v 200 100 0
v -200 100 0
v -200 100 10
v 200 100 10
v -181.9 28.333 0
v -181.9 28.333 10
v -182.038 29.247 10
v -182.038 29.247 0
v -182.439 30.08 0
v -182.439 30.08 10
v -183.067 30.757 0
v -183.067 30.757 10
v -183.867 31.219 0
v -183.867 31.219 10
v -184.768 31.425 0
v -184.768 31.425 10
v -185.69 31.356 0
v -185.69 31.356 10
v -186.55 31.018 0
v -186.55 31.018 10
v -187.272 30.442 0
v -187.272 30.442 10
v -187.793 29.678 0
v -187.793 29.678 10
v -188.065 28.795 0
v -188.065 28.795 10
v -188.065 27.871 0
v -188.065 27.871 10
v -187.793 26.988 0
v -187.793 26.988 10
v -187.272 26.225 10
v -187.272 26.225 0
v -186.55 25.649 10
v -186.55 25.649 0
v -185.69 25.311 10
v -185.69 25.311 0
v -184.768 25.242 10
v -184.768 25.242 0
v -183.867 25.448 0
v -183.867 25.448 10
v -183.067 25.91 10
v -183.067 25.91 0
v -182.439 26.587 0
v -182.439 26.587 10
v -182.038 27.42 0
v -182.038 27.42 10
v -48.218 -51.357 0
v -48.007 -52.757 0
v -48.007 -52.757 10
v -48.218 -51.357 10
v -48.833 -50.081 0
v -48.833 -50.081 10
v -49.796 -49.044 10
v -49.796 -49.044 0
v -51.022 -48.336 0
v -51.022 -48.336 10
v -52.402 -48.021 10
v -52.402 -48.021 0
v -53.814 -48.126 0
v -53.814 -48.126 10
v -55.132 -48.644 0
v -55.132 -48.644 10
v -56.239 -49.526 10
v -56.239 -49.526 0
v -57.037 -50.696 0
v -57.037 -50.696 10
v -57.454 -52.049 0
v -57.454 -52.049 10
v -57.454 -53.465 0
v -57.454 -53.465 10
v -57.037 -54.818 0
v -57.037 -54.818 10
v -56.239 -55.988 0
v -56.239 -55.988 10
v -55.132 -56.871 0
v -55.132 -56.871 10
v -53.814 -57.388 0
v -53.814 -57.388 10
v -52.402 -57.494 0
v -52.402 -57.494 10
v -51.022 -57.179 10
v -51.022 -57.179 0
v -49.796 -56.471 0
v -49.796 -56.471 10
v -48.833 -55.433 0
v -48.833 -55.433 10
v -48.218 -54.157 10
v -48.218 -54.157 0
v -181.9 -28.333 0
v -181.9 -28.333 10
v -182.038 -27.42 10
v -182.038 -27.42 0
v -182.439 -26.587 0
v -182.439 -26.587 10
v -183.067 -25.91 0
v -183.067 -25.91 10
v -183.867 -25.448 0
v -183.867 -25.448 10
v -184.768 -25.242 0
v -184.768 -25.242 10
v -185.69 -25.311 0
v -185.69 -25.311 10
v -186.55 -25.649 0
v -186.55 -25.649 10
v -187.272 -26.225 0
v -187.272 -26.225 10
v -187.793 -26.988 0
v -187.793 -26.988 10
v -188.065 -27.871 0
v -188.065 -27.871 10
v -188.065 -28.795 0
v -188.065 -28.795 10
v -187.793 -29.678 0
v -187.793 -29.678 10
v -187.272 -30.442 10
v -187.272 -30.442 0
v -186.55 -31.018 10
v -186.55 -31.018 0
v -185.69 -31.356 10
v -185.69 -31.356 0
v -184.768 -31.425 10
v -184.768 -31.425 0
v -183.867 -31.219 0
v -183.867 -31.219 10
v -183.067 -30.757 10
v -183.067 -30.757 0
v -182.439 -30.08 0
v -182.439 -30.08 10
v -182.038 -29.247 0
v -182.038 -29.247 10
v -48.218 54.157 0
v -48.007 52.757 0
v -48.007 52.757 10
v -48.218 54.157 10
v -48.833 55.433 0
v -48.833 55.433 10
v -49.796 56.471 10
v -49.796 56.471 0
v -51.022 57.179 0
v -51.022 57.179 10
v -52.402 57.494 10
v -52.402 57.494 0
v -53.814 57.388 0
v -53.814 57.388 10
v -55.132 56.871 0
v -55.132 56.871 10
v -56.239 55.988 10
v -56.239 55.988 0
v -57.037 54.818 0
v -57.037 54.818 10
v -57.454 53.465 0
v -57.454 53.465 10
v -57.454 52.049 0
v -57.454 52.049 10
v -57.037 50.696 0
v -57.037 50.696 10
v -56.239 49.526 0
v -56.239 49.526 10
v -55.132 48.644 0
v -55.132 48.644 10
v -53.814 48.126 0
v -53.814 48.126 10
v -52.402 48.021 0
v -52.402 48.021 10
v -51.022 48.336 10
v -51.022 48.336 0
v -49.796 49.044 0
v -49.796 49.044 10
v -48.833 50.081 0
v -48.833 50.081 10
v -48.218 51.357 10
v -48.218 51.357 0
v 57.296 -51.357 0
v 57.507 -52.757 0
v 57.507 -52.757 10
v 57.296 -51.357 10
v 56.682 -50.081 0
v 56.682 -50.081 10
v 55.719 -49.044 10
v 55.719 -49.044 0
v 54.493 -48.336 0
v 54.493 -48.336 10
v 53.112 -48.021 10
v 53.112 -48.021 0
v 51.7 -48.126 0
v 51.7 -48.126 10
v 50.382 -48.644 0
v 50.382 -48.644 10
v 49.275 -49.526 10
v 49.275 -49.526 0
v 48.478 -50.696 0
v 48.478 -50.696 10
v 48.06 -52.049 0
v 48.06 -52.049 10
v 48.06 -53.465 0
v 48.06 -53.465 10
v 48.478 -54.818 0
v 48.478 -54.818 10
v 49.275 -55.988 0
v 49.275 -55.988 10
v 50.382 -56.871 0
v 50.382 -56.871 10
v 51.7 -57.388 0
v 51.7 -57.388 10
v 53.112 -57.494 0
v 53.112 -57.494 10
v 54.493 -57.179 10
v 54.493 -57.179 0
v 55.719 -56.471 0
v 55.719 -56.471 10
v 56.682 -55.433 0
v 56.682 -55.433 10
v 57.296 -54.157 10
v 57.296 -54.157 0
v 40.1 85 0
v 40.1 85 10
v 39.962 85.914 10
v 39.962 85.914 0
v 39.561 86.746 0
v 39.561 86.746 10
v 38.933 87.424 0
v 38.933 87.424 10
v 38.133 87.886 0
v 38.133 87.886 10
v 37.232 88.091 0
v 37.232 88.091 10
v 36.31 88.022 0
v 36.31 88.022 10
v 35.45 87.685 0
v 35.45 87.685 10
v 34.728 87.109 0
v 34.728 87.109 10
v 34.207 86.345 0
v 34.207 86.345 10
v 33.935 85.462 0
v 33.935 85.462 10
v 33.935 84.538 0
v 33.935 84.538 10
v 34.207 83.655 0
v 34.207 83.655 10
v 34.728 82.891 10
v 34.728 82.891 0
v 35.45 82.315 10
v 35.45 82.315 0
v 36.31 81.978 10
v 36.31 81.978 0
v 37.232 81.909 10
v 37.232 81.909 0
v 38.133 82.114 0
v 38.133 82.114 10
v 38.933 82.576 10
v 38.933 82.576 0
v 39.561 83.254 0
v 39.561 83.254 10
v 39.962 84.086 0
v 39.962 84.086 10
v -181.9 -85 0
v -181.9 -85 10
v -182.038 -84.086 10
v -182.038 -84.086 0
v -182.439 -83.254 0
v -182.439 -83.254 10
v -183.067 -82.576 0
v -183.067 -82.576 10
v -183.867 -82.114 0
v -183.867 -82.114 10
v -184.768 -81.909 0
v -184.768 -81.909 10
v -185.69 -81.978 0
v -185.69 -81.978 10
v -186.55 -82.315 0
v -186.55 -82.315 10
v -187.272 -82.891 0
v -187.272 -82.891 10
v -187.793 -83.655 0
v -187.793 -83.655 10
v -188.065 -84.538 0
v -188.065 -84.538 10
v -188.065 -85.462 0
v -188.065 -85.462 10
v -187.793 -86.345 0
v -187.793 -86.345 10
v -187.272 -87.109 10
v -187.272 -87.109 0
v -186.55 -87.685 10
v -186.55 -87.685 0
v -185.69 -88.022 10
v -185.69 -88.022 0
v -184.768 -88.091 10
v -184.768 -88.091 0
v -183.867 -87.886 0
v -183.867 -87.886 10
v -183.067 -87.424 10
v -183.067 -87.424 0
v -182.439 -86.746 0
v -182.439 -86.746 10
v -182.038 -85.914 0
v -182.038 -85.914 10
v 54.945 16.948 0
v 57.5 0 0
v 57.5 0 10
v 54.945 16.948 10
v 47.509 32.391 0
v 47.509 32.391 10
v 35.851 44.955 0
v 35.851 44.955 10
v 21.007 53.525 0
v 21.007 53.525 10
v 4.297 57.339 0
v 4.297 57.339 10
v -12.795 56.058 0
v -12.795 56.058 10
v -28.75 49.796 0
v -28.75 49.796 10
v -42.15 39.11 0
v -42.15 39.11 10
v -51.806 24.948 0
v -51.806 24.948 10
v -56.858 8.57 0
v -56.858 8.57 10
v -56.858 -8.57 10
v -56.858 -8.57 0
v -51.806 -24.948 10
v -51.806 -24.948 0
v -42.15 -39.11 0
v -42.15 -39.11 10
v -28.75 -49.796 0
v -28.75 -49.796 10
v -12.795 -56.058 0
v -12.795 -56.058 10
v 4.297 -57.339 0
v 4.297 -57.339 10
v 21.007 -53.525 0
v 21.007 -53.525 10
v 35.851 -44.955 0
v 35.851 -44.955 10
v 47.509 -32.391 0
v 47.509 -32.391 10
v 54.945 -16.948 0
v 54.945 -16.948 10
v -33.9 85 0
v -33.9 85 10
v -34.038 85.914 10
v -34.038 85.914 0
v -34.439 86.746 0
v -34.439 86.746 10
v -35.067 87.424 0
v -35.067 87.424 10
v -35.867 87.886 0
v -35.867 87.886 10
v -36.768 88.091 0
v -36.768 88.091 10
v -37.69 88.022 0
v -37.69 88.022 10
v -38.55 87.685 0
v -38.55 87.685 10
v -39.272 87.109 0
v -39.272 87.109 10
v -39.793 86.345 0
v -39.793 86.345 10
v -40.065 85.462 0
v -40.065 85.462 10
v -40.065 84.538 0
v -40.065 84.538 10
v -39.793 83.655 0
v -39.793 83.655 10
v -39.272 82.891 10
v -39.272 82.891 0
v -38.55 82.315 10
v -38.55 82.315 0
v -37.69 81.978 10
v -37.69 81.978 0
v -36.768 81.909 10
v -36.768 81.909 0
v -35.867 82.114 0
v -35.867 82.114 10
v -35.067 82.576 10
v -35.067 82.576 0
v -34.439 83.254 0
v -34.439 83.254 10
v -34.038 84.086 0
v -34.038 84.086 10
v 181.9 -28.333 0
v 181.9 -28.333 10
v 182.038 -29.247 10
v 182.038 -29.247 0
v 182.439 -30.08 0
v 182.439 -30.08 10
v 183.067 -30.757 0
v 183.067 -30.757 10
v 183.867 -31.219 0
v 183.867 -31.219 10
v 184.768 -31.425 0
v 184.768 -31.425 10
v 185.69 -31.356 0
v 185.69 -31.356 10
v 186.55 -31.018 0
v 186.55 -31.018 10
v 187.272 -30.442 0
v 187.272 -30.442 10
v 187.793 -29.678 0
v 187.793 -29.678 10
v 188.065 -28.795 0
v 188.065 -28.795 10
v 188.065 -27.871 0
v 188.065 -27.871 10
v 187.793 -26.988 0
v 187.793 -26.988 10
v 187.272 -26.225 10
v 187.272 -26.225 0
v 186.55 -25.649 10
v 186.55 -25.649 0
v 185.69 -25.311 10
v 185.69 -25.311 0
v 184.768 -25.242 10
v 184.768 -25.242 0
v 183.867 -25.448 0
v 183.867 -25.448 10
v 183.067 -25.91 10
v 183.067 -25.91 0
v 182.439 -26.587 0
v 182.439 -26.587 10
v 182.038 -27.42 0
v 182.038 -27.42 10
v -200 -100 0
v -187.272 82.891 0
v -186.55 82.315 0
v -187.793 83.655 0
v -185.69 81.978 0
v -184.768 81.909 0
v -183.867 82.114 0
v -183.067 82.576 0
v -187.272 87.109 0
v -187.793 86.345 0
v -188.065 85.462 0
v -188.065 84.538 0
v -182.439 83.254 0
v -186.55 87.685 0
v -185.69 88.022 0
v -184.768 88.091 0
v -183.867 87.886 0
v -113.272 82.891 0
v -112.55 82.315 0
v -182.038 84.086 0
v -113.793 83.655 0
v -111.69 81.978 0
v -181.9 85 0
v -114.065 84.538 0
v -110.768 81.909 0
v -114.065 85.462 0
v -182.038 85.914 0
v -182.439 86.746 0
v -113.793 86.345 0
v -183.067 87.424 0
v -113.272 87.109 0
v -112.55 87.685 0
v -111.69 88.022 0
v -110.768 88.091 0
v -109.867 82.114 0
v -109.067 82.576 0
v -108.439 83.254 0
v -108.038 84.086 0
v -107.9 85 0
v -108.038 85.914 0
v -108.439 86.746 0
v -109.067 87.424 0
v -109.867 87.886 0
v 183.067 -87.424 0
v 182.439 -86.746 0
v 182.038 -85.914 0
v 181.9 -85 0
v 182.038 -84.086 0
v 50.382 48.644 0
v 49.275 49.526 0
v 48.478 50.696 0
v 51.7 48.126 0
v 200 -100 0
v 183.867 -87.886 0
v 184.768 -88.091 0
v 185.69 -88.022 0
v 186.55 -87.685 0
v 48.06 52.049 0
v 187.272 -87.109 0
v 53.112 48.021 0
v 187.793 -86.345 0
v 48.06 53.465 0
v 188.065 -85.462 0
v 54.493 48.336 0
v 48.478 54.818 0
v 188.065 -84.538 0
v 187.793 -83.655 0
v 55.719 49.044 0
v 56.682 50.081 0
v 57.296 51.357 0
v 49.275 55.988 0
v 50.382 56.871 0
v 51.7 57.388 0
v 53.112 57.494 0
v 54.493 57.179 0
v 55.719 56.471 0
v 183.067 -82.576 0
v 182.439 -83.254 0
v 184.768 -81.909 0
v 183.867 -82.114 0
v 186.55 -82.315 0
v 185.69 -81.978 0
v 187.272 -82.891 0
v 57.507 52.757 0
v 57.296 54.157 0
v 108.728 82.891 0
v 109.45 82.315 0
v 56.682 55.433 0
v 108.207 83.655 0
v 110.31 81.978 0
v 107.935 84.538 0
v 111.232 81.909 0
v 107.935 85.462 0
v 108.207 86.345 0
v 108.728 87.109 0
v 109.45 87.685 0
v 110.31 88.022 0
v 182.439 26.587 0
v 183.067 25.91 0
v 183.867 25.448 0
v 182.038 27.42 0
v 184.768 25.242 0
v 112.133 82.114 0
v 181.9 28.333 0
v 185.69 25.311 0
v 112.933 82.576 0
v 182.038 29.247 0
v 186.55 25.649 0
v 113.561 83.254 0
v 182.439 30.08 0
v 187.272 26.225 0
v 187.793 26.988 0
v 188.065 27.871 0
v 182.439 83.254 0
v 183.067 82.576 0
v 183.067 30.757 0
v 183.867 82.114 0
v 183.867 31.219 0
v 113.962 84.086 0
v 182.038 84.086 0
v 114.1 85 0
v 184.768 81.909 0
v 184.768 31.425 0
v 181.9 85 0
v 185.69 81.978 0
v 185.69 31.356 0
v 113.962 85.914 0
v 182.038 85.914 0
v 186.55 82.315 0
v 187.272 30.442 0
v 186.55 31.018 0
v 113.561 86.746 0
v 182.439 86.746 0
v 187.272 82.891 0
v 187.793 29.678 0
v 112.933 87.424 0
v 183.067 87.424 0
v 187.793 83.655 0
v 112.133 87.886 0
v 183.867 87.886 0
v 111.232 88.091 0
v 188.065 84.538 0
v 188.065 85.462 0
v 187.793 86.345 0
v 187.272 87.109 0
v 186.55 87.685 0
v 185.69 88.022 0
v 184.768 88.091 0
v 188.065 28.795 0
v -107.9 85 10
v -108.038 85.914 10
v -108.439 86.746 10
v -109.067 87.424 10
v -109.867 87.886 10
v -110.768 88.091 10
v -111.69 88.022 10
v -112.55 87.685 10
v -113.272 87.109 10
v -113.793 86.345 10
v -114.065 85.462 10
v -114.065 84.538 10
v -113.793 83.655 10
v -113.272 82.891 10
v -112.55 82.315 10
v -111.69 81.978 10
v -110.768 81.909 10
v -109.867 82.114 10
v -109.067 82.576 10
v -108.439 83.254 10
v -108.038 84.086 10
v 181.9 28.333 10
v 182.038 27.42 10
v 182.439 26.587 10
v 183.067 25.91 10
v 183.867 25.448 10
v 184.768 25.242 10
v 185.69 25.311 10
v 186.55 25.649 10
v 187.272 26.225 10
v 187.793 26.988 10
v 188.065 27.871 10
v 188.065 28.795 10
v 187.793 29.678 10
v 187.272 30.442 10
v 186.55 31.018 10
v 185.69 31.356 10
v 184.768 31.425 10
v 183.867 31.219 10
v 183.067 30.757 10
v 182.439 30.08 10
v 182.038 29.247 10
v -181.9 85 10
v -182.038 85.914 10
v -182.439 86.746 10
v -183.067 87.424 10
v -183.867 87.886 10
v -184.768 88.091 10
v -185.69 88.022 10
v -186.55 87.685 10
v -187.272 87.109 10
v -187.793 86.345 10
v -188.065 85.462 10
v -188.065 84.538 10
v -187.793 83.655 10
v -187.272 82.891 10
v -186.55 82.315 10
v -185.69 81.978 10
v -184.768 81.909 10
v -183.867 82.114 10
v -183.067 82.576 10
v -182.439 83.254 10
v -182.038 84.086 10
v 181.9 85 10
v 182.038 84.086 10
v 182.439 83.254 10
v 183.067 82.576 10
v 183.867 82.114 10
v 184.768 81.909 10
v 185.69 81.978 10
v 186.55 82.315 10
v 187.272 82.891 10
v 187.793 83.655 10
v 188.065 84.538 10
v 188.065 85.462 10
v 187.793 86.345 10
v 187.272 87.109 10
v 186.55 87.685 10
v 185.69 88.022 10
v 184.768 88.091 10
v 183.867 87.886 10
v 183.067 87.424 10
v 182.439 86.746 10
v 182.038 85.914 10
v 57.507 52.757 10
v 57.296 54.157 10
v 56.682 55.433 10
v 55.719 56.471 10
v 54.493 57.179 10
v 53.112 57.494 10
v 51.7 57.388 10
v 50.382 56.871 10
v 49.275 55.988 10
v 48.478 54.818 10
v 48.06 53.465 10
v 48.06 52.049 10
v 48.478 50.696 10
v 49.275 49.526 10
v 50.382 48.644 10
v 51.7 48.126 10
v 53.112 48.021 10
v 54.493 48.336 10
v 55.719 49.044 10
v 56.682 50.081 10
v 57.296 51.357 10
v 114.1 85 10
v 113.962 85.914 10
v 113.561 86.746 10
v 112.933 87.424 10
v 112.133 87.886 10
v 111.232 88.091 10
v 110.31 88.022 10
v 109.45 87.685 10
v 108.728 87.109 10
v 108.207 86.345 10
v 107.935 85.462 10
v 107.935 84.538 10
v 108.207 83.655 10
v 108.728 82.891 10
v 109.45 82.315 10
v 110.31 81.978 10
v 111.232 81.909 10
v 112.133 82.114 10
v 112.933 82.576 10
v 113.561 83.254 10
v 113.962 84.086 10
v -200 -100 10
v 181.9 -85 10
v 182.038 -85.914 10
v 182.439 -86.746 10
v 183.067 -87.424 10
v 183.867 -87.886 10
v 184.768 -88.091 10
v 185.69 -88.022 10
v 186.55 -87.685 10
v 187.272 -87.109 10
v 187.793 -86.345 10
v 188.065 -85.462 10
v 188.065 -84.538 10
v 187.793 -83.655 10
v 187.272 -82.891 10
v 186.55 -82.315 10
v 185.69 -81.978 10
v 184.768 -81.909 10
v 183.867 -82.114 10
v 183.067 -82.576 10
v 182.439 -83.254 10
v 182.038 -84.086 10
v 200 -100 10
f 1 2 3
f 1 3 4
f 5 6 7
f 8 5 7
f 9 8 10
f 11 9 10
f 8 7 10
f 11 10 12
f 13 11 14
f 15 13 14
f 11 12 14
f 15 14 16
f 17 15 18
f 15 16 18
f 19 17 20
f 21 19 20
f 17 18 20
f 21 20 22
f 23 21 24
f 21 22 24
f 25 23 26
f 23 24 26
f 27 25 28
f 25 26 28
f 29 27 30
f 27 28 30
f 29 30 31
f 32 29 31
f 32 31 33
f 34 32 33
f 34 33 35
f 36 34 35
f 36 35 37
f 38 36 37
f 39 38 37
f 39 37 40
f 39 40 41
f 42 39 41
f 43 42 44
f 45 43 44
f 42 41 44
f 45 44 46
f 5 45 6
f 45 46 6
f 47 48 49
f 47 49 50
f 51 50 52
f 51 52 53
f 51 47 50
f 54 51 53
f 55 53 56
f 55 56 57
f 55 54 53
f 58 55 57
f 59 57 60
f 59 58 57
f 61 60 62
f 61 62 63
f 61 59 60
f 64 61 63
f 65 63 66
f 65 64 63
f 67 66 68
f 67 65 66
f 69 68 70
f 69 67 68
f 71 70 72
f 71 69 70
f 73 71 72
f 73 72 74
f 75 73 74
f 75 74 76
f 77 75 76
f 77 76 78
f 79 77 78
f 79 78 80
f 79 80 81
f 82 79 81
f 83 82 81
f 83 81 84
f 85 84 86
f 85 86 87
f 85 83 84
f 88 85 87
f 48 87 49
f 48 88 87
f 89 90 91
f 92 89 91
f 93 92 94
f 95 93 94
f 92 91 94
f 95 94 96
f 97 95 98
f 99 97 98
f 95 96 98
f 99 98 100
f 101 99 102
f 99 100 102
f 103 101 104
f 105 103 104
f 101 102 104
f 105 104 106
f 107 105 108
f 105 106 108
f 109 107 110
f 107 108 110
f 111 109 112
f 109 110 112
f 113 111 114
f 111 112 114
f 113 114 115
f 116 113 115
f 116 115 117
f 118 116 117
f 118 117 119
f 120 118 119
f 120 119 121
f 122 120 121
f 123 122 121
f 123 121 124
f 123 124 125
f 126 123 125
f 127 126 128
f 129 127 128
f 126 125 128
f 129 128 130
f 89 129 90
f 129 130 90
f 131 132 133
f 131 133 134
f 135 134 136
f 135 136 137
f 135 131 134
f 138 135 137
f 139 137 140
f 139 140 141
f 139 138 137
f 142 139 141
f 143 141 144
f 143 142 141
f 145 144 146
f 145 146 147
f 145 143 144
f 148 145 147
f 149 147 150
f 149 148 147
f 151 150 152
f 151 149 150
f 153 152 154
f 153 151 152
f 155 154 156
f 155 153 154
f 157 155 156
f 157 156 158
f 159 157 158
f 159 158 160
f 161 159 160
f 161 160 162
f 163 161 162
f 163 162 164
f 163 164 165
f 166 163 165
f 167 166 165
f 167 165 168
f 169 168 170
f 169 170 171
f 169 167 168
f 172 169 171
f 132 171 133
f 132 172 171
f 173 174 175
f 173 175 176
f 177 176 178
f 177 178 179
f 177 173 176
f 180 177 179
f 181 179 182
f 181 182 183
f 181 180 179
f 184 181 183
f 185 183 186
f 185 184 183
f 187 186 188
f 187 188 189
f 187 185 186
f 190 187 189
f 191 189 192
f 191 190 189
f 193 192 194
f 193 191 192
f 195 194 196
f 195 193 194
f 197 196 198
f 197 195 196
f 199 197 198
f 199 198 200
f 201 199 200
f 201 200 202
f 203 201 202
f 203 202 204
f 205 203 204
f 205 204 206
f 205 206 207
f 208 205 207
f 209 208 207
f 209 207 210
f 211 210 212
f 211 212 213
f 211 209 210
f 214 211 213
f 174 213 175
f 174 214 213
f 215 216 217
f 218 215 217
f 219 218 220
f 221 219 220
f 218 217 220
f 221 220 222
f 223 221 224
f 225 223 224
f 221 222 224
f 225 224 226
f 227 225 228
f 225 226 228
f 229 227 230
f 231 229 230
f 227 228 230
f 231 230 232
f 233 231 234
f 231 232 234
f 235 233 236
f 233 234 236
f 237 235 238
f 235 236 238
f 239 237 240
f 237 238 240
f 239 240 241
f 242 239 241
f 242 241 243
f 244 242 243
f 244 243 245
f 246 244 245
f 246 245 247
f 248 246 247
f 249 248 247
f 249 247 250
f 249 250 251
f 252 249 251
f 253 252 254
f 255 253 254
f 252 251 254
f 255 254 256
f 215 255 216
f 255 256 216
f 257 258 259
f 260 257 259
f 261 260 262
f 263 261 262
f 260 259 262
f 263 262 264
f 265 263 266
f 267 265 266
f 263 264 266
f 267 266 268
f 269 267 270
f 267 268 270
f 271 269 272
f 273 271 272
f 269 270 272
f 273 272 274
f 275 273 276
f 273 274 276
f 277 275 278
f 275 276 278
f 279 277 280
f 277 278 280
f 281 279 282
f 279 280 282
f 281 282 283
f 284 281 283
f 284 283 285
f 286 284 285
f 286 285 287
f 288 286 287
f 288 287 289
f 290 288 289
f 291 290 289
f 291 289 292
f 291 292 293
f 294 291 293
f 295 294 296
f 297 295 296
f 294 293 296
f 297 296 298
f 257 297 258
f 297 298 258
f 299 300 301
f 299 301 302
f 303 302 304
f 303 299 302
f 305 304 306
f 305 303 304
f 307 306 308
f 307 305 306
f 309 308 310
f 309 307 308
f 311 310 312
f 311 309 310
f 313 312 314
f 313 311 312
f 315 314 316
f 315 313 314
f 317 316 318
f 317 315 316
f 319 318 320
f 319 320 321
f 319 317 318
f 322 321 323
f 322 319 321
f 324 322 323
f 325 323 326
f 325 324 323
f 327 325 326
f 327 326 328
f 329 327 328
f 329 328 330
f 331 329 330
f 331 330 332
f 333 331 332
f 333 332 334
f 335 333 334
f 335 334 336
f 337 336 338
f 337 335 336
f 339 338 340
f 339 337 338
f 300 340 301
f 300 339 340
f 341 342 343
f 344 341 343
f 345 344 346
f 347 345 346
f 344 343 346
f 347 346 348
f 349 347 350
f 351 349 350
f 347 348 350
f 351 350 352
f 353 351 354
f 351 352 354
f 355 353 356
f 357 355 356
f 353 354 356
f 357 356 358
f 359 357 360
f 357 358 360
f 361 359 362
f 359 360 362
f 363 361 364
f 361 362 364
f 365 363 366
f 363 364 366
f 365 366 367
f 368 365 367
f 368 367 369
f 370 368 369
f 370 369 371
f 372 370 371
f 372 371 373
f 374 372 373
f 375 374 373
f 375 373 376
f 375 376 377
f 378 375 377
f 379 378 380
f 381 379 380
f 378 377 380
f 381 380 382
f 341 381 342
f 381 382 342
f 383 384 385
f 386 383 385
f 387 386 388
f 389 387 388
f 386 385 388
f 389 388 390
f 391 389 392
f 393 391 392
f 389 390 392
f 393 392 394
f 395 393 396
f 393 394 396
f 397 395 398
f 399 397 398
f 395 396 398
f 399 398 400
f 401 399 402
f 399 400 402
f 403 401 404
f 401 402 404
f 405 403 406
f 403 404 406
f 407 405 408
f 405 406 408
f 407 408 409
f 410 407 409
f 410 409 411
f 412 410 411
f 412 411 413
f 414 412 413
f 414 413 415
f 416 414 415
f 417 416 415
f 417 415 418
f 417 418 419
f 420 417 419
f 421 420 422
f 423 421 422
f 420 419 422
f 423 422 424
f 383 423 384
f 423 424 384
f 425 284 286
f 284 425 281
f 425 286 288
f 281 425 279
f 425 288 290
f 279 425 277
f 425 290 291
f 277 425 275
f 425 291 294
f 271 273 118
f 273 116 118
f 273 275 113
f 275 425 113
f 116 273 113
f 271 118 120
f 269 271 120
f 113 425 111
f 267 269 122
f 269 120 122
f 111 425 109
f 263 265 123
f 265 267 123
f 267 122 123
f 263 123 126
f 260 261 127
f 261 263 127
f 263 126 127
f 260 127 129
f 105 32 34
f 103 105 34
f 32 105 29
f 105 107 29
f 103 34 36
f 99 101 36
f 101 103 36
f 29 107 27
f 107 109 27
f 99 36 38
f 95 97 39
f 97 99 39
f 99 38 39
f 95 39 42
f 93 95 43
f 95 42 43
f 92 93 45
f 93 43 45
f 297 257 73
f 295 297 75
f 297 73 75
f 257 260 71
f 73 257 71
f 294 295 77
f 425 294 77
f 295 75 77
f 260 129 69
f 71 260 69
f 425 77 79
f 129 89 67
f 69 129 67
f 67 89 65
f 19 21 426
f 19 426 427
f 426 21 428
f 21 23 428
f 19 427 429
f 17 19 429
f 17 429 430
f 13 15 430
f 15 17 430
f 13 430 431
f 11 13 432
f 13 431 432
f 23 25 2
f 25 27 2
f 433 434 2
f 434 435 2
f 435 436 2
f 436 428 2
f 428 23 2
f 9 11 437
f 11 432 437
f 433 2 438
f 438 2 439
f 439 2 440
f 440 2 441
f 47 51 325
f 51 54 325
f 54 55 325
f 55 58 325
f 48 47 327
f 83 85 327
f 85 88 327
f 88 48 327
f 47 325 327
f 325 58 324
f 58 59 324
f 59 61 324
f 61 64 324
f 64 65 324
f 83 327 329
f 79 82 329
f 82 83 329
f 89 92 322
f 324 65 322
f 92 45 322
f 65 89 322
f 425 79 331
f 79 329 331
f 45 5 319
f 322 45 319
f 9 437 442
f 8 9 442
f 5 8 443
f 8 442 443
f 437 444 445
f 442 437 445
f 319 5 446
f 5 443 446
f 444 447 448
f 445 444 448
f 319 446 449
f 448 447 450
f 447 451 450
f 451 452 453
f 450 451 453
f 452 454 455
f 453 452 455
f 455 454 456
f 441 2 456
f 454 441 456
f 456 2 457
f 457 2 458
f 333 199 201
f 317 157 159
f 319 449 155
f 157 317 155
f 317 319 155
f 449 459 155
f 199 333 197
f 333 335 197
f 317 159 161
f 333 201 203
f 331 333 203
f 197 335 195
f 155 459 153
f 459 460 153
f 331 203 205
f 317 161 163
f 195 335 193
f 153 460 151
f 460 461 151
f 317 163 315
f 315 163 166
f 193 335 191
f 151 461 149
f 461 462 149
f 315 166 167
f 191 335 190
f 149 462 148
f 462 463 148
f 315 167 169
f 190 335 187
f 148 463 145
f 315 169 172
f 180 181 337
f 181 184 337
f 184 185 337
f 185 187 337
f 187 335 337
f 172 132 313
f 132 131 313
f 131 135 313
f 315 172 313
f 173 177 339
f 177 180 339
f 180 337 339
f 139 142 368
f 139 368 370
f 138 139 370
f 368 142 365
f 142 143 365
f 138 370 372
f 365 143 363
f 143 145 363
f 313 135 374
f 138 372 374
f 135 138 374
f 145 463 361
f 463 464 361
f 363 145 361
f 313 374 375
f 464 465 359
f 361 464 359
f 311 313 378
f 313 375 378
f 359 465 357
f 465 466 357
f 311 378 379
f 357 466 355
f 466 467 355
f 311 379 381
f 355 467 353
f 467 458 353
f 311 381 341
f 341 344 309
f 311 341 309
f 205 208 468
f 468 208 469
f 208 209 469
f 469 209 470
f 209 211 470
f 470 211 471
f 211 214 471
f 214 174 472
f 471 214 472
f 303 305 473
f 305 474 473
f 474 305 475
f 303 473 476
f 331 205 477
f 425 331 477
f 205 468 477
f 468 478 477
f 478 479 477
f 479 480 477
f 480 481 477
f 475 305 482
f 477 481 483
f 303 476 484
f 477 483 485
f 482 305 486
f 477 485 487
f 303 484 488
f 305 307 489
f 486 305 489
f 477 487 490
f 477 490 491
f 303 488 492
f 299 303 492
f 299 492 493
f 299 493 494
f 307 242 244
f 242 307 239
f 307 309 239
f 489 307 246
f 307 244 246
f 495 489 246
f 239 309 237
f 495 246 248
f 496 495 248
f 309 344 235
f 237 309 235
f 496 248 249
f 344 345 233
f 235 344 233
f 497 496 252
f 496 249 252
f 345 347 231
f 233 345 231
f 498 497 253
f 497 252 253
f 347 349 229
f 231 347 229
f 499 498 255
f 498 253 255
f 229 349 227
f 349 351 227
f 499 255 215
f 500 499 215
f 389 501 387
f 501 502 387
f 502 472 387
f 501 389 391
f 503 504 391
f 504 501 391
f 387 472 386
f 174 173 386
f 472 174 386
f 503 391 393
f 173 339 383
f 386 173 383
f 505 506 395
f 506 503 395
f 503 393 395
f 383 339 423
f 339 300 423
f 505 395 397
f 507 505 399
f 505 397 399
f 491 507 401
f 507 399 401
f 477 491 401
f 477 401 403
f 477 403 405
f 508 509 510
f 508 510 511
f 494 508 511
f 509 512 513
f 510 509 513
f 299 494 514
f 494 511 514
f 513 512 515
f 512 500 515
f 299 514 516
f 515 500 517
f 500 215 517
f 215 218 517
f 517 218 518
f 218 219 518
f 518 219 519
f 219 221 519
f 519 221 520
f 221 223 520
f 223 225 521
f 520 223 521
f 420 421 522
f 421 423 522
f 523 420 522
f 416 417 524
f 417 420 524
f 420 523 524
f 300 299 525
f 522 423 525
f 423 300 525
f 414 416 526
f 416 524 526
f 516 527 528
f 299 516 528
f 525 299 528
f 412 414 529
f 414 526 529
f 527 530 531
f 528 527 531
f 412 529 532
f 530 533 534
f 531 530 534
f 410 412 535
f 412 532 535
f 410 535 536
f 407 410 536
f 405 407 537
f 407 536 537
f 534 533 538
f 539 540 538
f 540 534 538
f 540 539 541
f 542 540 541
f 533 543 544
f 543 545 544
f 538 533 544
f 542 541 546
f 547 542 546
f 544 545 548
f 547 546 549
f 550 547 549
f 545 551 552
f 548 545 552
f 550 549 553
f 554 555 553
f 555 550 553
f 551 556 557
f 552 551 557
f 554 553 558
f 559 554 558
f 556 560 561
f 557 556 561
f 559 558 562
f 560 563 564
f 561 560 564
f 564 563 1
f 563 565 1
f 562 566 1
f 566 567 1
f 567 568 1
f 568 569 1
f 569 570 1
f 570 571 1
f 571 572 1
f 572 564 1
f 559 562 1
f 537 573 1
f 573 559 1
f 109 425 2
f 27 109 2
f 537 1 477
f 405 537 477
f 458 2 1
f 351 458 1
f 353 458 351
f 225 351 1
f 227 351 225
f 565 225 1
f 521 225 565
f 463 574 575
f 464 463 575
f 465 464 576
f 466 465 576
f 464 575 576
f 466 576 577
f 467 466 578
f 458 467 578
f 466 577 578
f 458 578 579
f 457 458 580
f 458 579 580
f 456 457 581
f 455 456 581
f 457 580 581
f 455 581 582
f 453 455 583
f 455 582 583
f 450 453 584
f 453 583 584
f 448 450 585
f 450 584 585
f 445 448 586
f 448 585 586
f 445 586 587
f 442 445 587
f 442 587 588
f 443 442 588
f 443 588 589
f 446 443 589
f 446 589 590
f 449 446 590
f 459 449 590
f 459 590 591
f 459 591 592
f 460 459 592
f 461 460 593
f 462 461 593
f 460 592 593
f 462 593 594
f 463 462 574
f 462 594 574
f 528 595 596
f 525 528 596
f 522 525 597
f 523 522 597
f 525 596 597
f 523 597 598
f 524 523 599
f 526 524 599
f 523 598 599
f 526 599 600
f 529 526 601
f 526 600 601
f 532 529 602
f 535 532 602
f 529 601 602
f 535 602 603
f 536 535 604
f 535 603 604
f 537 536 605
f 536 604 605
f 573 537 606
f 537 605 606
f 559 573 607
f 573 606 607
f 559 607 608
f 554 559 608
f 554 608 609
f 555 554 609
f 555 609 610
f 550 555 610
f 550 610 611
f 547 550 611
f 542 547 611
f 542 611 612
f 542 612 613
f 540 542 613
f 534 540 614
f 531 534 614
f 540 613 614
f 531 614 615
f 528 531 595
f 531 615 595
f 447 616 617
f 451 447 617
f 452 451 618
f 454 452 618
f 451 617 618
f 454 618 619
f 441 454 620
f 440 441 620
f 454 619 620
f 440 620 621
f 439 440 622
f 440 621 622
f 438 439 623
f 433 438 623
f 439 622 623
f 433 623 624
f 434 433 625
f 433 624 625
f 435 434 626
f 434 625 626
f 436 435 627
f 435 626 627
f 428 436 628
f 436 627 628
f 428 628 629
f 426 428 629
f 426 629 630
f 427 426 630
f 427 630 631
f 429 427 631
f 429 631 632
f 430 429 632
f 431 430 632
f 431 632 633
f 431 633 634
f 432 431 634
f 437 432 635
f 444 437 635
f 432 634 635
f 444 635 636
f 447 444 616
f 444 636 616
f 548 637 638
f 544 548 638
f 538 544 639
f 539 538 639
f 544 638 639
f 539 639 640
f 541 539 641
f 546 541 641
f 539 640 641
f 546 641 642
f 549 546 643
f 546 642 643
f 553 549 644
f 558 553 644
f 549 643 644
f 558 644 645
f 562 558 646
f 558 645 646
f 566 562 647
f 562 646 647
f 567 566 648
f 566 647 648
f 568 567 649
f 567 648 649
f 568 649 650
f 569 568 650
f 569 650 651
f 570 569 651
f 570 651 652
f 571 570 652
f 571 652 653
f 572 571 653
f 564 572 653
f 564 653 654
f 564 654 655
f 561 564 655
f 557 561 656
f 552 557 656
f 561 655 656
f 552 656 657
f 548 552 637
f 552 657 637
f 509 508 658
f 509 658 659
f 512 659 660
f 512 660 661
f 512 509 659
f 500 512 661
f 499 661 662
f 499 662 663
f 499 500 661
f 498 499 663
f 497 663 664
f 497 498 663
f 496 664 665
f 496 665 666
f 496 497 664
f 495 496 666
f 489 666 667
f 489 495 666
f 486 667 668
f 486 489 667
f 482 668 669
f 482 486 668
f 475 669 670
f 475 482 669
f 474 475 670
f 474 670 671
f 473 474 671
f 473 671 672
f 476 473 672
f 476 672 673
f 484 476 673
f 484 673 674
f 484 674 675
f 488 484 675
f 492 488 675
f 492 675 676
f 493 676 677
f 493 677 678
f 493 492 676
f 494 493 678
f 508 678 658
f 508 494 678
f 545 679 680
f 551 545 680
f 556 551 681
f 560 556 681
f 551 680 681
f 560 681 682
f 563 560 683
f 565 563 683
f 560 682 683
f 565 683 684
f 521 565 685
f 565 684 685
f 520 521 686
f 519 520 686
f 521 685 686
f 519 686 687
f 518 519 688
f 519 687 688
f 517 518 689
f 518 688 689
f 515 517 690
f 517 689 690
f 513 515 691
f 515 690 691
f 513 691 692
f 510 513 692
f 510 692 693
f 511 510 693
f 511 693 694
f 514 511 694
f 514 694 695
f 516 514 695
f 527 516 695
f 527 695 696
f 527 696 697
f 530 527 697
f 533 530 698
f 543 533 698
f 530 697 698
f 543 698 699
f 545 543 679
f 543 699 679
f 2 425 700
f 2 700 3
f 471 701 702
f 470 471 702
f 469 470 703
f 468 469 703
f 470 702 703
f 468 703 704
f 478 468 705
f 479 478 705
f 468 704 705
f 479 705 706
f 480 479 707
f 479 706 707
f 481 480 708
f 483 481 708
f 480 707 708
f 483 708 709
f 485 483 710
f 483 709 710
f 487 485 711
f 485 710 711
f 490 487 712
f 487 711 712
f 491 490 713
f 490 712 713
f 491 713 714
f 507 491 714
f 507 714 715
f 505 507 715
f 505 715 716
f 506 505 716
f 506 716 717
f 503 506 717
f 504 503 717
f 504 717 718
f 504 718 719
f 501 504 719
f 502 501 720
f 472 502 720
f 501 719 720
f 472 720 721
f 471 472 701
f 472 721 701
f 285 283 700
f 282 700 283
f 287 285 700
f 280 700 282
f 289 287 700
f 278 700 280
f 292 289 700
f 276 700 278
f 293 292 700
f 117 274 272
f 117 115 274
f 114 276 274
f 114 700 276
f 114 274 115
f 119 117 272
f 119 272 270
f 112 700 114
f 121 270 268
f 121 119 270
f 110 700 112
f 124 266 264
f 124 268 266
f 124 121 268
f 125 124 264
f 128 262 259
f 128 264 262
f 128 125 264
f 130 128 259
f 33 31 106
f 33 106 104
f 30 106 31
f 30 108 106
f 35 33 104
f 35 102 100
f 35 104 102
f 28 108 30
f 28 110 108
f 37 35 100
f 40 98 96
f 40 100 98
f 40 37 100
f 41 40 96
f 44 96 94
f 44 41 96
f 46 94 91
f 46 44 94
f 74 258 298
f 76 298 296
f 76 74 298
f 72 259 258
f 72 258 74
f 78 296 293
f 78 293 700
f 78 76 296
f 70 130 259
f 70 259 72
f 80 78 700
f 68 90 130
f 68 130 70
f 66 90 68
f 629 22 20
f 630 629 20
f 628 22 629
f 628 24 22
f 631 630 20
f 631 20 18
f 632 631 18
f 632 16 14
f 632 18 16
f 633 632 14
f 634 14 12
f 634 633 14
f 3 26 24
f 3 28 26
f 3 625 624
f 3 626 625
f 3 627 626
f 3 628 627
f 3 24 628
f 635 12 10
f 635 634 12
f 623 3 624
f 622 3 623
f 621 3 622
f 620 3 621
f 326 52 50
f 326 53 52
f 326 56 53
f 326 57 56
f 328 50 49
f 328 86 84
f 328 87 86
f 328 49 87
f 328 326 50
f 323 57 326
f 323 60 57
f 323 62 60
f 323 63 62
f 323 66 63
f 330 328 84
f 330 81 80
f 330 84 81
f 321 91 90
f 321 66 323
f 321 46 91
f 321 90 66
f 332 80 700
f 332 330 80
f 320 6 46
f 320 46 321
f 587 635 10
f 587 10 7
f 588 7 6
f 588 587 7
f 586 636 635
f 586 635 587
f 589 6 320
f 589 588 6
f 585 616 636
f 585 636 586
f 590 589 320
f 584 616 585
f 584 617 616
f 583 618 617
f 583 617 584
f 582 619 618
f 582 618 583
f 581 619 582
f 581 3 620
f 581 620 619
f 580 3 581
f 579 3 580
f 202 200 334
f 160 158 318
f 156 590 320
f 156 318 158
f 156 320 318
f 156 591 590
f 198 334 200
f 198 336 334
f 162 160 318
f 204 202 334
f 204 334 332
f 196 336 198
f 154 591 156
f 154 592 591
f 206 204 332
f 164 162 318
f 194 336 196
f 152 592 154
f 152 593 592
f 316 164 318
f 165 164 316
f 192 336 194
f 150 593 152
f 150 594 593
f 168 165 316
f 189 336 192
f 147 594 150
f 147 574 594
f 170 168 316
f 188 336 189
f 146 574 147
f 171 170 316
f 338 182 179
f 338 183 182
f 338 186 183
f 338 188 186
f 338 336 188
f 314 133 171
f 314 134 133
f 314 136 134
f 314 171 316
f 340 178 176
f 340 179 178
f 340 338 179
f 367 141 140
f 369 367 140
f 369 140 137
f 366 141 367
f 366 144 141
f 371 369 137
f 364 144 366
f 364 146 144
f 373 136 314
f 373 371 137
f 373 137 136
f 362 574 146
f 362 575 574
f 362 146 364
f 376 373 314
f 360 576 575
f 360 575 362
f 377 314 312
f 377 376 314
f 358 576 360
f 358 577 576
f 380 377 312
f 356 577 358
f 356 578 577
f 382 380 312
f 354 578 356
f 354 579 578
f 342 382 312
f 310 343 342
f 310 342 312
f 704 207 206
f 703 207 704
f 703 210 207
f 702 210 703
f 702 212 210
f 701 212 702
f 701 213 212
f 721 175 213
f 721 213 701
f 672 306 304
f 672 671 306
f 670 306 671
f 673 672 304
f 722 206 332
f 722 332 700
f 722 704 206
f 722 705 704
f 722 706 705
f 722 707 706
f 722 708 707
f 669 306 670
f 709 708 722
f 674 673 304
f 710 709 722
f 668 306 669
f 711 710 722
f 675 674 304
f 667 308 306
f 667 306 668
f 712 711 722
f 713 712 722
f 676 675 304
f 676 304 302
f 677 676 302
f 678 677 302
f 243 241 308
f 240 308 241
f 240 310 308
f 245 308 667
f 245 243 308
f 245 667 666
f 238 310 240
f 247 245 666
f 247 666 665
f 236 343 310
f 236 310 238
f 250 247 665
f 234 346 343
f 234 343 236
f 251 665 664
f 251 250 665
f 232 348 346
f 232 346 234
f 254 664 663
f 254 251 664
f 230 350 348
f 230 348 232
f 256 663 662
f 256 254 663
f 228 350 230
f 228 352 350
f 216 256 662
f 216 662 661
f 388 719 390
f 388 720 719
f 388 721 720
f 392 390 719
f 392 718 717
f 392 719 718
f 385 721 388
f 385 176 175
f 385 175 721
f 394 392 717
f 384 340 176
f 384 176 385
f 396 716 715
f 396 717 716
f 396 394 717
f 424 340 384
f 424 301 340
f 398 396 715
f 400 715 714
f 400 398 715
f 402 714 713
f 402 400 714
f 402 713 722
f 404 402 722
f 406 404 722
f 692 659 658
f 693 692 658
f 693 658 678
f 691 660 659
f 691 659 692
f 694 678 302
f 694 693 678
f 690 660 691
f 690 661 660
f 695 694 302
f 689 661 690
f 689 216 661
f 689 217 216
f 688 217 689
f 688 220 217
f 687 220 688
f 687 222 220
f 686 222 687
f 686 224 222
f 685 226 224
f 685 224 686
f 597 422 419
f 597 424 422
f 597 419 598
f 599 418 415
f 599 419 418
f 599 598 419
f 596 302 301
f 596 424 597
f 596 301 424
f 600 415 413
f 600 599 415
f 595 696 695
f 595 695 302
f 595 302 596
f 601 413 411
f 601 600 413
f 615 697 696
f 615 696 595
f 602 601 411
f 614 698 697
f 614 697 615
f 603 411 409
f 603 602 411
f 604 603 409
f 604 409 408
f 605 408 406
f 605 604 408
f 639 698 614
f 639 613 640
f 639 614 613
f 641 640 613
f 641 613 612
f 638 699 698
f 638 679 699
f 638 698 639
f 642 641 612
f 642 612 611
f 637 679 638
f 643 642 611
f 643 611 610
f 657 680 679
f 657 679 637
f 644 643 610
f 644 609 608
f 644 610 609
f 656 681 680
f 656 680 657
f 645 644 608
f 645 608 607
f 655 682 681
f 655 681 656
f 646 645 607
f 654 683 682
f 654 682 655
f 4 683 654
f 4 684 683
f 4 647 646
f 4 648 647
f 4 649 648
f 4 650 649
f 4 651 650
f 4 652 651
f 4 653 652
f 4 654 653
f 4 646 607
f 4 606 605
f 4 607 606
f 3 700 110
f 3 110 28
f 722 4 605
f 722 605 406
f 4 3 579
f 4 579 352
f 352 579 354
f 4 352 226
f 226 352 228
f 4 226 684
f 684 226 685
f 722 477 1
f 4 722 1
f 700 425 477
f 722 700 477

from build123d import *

# Parameters (mm, degrees)
SKETCH1_W           = 400
SKETCH1_H           = 200
SKETCH1_R           = 4.75
SKETCH1_R_2         = 57.5
BOSS_EXTRUDE1_DEPTH = 10
SKETCH2_R           = 3.1
CUT_EXTRUDE1_DEPTH  = 10


with BuildPart() as part:
    # Sketch1 → Boss-Extrude1 (new body)
    with BuildSketch(Plane.XY):
        Rectangle(SKETCH1_W, SKETCH1_H)
        with Locations((-52.757236944, 52.757236944)):
            Circle(SKETCH1_R, mode=Mode.SUBTRACT)
        with Locations((52.757236944, 52.757236944)):
            Circle(SKETCH1_R, mode=Mode.SUBTRACT)
        with Locations((52.757236944, -52.757236944)):
            Circle(SKETCH1_R, mode=Mode.SUBTRACT)
        with Locations((-52.757236944, -52.757236944)):
            Circle(SKETCH1_R, mode=Mode.SUBTRACT)
        Circle(SKETCH1_R_2, mode=Mode.SUBTRACT)
    extrude(amount=BOSS_EXTRUDE1_DEPTH)

    # Sketch2 → Cut-Extrude1 (cut)
    with BuildSketch(Plane.XY.offset(10)):
        with Locations((-185, 85)):
            Circle(SKETCH2_R)
        with Locations((-185, 28.333333333)):
            Circle(SKETCH2_R)
        with Locations((-185, -85)):
            Circle(SKETCH2_R)
        with Locations((-185, -28.333333333)):
            Circle(SKETCH2_R)
        with Locations(Location((185, -28.333333333, 0), (0, 0, 180))):
            Circle(SKETCH2_R)
        with Locations(Location((185, -85, 0), (0, 0, 180))):
            Circle(SKETCH2_R)
        with Locations(Location((185, 28.333333333, 0), (0, 0, 180))):
            Circle(SKETCH2_R)
        with Locations(Location((185, 85, 0), (0, 0, 180))):
            Circle(SKETCH2_R)
        with Locations((-111, 85)):
            Circle(SKETCH2_R)
        with Locations((-37, 85)):
            Circle(SKETCH2_R)
        with Locations((37, 85)):
            Circle(SKETCH2_R)
        with Locations((111, 85)):
            Circle(SKETCH2_R)
    extrude(amount=-CUT_EXTRUDE1_DEPTH, mode=Mode.SUBTRACT)


solid = part.part
